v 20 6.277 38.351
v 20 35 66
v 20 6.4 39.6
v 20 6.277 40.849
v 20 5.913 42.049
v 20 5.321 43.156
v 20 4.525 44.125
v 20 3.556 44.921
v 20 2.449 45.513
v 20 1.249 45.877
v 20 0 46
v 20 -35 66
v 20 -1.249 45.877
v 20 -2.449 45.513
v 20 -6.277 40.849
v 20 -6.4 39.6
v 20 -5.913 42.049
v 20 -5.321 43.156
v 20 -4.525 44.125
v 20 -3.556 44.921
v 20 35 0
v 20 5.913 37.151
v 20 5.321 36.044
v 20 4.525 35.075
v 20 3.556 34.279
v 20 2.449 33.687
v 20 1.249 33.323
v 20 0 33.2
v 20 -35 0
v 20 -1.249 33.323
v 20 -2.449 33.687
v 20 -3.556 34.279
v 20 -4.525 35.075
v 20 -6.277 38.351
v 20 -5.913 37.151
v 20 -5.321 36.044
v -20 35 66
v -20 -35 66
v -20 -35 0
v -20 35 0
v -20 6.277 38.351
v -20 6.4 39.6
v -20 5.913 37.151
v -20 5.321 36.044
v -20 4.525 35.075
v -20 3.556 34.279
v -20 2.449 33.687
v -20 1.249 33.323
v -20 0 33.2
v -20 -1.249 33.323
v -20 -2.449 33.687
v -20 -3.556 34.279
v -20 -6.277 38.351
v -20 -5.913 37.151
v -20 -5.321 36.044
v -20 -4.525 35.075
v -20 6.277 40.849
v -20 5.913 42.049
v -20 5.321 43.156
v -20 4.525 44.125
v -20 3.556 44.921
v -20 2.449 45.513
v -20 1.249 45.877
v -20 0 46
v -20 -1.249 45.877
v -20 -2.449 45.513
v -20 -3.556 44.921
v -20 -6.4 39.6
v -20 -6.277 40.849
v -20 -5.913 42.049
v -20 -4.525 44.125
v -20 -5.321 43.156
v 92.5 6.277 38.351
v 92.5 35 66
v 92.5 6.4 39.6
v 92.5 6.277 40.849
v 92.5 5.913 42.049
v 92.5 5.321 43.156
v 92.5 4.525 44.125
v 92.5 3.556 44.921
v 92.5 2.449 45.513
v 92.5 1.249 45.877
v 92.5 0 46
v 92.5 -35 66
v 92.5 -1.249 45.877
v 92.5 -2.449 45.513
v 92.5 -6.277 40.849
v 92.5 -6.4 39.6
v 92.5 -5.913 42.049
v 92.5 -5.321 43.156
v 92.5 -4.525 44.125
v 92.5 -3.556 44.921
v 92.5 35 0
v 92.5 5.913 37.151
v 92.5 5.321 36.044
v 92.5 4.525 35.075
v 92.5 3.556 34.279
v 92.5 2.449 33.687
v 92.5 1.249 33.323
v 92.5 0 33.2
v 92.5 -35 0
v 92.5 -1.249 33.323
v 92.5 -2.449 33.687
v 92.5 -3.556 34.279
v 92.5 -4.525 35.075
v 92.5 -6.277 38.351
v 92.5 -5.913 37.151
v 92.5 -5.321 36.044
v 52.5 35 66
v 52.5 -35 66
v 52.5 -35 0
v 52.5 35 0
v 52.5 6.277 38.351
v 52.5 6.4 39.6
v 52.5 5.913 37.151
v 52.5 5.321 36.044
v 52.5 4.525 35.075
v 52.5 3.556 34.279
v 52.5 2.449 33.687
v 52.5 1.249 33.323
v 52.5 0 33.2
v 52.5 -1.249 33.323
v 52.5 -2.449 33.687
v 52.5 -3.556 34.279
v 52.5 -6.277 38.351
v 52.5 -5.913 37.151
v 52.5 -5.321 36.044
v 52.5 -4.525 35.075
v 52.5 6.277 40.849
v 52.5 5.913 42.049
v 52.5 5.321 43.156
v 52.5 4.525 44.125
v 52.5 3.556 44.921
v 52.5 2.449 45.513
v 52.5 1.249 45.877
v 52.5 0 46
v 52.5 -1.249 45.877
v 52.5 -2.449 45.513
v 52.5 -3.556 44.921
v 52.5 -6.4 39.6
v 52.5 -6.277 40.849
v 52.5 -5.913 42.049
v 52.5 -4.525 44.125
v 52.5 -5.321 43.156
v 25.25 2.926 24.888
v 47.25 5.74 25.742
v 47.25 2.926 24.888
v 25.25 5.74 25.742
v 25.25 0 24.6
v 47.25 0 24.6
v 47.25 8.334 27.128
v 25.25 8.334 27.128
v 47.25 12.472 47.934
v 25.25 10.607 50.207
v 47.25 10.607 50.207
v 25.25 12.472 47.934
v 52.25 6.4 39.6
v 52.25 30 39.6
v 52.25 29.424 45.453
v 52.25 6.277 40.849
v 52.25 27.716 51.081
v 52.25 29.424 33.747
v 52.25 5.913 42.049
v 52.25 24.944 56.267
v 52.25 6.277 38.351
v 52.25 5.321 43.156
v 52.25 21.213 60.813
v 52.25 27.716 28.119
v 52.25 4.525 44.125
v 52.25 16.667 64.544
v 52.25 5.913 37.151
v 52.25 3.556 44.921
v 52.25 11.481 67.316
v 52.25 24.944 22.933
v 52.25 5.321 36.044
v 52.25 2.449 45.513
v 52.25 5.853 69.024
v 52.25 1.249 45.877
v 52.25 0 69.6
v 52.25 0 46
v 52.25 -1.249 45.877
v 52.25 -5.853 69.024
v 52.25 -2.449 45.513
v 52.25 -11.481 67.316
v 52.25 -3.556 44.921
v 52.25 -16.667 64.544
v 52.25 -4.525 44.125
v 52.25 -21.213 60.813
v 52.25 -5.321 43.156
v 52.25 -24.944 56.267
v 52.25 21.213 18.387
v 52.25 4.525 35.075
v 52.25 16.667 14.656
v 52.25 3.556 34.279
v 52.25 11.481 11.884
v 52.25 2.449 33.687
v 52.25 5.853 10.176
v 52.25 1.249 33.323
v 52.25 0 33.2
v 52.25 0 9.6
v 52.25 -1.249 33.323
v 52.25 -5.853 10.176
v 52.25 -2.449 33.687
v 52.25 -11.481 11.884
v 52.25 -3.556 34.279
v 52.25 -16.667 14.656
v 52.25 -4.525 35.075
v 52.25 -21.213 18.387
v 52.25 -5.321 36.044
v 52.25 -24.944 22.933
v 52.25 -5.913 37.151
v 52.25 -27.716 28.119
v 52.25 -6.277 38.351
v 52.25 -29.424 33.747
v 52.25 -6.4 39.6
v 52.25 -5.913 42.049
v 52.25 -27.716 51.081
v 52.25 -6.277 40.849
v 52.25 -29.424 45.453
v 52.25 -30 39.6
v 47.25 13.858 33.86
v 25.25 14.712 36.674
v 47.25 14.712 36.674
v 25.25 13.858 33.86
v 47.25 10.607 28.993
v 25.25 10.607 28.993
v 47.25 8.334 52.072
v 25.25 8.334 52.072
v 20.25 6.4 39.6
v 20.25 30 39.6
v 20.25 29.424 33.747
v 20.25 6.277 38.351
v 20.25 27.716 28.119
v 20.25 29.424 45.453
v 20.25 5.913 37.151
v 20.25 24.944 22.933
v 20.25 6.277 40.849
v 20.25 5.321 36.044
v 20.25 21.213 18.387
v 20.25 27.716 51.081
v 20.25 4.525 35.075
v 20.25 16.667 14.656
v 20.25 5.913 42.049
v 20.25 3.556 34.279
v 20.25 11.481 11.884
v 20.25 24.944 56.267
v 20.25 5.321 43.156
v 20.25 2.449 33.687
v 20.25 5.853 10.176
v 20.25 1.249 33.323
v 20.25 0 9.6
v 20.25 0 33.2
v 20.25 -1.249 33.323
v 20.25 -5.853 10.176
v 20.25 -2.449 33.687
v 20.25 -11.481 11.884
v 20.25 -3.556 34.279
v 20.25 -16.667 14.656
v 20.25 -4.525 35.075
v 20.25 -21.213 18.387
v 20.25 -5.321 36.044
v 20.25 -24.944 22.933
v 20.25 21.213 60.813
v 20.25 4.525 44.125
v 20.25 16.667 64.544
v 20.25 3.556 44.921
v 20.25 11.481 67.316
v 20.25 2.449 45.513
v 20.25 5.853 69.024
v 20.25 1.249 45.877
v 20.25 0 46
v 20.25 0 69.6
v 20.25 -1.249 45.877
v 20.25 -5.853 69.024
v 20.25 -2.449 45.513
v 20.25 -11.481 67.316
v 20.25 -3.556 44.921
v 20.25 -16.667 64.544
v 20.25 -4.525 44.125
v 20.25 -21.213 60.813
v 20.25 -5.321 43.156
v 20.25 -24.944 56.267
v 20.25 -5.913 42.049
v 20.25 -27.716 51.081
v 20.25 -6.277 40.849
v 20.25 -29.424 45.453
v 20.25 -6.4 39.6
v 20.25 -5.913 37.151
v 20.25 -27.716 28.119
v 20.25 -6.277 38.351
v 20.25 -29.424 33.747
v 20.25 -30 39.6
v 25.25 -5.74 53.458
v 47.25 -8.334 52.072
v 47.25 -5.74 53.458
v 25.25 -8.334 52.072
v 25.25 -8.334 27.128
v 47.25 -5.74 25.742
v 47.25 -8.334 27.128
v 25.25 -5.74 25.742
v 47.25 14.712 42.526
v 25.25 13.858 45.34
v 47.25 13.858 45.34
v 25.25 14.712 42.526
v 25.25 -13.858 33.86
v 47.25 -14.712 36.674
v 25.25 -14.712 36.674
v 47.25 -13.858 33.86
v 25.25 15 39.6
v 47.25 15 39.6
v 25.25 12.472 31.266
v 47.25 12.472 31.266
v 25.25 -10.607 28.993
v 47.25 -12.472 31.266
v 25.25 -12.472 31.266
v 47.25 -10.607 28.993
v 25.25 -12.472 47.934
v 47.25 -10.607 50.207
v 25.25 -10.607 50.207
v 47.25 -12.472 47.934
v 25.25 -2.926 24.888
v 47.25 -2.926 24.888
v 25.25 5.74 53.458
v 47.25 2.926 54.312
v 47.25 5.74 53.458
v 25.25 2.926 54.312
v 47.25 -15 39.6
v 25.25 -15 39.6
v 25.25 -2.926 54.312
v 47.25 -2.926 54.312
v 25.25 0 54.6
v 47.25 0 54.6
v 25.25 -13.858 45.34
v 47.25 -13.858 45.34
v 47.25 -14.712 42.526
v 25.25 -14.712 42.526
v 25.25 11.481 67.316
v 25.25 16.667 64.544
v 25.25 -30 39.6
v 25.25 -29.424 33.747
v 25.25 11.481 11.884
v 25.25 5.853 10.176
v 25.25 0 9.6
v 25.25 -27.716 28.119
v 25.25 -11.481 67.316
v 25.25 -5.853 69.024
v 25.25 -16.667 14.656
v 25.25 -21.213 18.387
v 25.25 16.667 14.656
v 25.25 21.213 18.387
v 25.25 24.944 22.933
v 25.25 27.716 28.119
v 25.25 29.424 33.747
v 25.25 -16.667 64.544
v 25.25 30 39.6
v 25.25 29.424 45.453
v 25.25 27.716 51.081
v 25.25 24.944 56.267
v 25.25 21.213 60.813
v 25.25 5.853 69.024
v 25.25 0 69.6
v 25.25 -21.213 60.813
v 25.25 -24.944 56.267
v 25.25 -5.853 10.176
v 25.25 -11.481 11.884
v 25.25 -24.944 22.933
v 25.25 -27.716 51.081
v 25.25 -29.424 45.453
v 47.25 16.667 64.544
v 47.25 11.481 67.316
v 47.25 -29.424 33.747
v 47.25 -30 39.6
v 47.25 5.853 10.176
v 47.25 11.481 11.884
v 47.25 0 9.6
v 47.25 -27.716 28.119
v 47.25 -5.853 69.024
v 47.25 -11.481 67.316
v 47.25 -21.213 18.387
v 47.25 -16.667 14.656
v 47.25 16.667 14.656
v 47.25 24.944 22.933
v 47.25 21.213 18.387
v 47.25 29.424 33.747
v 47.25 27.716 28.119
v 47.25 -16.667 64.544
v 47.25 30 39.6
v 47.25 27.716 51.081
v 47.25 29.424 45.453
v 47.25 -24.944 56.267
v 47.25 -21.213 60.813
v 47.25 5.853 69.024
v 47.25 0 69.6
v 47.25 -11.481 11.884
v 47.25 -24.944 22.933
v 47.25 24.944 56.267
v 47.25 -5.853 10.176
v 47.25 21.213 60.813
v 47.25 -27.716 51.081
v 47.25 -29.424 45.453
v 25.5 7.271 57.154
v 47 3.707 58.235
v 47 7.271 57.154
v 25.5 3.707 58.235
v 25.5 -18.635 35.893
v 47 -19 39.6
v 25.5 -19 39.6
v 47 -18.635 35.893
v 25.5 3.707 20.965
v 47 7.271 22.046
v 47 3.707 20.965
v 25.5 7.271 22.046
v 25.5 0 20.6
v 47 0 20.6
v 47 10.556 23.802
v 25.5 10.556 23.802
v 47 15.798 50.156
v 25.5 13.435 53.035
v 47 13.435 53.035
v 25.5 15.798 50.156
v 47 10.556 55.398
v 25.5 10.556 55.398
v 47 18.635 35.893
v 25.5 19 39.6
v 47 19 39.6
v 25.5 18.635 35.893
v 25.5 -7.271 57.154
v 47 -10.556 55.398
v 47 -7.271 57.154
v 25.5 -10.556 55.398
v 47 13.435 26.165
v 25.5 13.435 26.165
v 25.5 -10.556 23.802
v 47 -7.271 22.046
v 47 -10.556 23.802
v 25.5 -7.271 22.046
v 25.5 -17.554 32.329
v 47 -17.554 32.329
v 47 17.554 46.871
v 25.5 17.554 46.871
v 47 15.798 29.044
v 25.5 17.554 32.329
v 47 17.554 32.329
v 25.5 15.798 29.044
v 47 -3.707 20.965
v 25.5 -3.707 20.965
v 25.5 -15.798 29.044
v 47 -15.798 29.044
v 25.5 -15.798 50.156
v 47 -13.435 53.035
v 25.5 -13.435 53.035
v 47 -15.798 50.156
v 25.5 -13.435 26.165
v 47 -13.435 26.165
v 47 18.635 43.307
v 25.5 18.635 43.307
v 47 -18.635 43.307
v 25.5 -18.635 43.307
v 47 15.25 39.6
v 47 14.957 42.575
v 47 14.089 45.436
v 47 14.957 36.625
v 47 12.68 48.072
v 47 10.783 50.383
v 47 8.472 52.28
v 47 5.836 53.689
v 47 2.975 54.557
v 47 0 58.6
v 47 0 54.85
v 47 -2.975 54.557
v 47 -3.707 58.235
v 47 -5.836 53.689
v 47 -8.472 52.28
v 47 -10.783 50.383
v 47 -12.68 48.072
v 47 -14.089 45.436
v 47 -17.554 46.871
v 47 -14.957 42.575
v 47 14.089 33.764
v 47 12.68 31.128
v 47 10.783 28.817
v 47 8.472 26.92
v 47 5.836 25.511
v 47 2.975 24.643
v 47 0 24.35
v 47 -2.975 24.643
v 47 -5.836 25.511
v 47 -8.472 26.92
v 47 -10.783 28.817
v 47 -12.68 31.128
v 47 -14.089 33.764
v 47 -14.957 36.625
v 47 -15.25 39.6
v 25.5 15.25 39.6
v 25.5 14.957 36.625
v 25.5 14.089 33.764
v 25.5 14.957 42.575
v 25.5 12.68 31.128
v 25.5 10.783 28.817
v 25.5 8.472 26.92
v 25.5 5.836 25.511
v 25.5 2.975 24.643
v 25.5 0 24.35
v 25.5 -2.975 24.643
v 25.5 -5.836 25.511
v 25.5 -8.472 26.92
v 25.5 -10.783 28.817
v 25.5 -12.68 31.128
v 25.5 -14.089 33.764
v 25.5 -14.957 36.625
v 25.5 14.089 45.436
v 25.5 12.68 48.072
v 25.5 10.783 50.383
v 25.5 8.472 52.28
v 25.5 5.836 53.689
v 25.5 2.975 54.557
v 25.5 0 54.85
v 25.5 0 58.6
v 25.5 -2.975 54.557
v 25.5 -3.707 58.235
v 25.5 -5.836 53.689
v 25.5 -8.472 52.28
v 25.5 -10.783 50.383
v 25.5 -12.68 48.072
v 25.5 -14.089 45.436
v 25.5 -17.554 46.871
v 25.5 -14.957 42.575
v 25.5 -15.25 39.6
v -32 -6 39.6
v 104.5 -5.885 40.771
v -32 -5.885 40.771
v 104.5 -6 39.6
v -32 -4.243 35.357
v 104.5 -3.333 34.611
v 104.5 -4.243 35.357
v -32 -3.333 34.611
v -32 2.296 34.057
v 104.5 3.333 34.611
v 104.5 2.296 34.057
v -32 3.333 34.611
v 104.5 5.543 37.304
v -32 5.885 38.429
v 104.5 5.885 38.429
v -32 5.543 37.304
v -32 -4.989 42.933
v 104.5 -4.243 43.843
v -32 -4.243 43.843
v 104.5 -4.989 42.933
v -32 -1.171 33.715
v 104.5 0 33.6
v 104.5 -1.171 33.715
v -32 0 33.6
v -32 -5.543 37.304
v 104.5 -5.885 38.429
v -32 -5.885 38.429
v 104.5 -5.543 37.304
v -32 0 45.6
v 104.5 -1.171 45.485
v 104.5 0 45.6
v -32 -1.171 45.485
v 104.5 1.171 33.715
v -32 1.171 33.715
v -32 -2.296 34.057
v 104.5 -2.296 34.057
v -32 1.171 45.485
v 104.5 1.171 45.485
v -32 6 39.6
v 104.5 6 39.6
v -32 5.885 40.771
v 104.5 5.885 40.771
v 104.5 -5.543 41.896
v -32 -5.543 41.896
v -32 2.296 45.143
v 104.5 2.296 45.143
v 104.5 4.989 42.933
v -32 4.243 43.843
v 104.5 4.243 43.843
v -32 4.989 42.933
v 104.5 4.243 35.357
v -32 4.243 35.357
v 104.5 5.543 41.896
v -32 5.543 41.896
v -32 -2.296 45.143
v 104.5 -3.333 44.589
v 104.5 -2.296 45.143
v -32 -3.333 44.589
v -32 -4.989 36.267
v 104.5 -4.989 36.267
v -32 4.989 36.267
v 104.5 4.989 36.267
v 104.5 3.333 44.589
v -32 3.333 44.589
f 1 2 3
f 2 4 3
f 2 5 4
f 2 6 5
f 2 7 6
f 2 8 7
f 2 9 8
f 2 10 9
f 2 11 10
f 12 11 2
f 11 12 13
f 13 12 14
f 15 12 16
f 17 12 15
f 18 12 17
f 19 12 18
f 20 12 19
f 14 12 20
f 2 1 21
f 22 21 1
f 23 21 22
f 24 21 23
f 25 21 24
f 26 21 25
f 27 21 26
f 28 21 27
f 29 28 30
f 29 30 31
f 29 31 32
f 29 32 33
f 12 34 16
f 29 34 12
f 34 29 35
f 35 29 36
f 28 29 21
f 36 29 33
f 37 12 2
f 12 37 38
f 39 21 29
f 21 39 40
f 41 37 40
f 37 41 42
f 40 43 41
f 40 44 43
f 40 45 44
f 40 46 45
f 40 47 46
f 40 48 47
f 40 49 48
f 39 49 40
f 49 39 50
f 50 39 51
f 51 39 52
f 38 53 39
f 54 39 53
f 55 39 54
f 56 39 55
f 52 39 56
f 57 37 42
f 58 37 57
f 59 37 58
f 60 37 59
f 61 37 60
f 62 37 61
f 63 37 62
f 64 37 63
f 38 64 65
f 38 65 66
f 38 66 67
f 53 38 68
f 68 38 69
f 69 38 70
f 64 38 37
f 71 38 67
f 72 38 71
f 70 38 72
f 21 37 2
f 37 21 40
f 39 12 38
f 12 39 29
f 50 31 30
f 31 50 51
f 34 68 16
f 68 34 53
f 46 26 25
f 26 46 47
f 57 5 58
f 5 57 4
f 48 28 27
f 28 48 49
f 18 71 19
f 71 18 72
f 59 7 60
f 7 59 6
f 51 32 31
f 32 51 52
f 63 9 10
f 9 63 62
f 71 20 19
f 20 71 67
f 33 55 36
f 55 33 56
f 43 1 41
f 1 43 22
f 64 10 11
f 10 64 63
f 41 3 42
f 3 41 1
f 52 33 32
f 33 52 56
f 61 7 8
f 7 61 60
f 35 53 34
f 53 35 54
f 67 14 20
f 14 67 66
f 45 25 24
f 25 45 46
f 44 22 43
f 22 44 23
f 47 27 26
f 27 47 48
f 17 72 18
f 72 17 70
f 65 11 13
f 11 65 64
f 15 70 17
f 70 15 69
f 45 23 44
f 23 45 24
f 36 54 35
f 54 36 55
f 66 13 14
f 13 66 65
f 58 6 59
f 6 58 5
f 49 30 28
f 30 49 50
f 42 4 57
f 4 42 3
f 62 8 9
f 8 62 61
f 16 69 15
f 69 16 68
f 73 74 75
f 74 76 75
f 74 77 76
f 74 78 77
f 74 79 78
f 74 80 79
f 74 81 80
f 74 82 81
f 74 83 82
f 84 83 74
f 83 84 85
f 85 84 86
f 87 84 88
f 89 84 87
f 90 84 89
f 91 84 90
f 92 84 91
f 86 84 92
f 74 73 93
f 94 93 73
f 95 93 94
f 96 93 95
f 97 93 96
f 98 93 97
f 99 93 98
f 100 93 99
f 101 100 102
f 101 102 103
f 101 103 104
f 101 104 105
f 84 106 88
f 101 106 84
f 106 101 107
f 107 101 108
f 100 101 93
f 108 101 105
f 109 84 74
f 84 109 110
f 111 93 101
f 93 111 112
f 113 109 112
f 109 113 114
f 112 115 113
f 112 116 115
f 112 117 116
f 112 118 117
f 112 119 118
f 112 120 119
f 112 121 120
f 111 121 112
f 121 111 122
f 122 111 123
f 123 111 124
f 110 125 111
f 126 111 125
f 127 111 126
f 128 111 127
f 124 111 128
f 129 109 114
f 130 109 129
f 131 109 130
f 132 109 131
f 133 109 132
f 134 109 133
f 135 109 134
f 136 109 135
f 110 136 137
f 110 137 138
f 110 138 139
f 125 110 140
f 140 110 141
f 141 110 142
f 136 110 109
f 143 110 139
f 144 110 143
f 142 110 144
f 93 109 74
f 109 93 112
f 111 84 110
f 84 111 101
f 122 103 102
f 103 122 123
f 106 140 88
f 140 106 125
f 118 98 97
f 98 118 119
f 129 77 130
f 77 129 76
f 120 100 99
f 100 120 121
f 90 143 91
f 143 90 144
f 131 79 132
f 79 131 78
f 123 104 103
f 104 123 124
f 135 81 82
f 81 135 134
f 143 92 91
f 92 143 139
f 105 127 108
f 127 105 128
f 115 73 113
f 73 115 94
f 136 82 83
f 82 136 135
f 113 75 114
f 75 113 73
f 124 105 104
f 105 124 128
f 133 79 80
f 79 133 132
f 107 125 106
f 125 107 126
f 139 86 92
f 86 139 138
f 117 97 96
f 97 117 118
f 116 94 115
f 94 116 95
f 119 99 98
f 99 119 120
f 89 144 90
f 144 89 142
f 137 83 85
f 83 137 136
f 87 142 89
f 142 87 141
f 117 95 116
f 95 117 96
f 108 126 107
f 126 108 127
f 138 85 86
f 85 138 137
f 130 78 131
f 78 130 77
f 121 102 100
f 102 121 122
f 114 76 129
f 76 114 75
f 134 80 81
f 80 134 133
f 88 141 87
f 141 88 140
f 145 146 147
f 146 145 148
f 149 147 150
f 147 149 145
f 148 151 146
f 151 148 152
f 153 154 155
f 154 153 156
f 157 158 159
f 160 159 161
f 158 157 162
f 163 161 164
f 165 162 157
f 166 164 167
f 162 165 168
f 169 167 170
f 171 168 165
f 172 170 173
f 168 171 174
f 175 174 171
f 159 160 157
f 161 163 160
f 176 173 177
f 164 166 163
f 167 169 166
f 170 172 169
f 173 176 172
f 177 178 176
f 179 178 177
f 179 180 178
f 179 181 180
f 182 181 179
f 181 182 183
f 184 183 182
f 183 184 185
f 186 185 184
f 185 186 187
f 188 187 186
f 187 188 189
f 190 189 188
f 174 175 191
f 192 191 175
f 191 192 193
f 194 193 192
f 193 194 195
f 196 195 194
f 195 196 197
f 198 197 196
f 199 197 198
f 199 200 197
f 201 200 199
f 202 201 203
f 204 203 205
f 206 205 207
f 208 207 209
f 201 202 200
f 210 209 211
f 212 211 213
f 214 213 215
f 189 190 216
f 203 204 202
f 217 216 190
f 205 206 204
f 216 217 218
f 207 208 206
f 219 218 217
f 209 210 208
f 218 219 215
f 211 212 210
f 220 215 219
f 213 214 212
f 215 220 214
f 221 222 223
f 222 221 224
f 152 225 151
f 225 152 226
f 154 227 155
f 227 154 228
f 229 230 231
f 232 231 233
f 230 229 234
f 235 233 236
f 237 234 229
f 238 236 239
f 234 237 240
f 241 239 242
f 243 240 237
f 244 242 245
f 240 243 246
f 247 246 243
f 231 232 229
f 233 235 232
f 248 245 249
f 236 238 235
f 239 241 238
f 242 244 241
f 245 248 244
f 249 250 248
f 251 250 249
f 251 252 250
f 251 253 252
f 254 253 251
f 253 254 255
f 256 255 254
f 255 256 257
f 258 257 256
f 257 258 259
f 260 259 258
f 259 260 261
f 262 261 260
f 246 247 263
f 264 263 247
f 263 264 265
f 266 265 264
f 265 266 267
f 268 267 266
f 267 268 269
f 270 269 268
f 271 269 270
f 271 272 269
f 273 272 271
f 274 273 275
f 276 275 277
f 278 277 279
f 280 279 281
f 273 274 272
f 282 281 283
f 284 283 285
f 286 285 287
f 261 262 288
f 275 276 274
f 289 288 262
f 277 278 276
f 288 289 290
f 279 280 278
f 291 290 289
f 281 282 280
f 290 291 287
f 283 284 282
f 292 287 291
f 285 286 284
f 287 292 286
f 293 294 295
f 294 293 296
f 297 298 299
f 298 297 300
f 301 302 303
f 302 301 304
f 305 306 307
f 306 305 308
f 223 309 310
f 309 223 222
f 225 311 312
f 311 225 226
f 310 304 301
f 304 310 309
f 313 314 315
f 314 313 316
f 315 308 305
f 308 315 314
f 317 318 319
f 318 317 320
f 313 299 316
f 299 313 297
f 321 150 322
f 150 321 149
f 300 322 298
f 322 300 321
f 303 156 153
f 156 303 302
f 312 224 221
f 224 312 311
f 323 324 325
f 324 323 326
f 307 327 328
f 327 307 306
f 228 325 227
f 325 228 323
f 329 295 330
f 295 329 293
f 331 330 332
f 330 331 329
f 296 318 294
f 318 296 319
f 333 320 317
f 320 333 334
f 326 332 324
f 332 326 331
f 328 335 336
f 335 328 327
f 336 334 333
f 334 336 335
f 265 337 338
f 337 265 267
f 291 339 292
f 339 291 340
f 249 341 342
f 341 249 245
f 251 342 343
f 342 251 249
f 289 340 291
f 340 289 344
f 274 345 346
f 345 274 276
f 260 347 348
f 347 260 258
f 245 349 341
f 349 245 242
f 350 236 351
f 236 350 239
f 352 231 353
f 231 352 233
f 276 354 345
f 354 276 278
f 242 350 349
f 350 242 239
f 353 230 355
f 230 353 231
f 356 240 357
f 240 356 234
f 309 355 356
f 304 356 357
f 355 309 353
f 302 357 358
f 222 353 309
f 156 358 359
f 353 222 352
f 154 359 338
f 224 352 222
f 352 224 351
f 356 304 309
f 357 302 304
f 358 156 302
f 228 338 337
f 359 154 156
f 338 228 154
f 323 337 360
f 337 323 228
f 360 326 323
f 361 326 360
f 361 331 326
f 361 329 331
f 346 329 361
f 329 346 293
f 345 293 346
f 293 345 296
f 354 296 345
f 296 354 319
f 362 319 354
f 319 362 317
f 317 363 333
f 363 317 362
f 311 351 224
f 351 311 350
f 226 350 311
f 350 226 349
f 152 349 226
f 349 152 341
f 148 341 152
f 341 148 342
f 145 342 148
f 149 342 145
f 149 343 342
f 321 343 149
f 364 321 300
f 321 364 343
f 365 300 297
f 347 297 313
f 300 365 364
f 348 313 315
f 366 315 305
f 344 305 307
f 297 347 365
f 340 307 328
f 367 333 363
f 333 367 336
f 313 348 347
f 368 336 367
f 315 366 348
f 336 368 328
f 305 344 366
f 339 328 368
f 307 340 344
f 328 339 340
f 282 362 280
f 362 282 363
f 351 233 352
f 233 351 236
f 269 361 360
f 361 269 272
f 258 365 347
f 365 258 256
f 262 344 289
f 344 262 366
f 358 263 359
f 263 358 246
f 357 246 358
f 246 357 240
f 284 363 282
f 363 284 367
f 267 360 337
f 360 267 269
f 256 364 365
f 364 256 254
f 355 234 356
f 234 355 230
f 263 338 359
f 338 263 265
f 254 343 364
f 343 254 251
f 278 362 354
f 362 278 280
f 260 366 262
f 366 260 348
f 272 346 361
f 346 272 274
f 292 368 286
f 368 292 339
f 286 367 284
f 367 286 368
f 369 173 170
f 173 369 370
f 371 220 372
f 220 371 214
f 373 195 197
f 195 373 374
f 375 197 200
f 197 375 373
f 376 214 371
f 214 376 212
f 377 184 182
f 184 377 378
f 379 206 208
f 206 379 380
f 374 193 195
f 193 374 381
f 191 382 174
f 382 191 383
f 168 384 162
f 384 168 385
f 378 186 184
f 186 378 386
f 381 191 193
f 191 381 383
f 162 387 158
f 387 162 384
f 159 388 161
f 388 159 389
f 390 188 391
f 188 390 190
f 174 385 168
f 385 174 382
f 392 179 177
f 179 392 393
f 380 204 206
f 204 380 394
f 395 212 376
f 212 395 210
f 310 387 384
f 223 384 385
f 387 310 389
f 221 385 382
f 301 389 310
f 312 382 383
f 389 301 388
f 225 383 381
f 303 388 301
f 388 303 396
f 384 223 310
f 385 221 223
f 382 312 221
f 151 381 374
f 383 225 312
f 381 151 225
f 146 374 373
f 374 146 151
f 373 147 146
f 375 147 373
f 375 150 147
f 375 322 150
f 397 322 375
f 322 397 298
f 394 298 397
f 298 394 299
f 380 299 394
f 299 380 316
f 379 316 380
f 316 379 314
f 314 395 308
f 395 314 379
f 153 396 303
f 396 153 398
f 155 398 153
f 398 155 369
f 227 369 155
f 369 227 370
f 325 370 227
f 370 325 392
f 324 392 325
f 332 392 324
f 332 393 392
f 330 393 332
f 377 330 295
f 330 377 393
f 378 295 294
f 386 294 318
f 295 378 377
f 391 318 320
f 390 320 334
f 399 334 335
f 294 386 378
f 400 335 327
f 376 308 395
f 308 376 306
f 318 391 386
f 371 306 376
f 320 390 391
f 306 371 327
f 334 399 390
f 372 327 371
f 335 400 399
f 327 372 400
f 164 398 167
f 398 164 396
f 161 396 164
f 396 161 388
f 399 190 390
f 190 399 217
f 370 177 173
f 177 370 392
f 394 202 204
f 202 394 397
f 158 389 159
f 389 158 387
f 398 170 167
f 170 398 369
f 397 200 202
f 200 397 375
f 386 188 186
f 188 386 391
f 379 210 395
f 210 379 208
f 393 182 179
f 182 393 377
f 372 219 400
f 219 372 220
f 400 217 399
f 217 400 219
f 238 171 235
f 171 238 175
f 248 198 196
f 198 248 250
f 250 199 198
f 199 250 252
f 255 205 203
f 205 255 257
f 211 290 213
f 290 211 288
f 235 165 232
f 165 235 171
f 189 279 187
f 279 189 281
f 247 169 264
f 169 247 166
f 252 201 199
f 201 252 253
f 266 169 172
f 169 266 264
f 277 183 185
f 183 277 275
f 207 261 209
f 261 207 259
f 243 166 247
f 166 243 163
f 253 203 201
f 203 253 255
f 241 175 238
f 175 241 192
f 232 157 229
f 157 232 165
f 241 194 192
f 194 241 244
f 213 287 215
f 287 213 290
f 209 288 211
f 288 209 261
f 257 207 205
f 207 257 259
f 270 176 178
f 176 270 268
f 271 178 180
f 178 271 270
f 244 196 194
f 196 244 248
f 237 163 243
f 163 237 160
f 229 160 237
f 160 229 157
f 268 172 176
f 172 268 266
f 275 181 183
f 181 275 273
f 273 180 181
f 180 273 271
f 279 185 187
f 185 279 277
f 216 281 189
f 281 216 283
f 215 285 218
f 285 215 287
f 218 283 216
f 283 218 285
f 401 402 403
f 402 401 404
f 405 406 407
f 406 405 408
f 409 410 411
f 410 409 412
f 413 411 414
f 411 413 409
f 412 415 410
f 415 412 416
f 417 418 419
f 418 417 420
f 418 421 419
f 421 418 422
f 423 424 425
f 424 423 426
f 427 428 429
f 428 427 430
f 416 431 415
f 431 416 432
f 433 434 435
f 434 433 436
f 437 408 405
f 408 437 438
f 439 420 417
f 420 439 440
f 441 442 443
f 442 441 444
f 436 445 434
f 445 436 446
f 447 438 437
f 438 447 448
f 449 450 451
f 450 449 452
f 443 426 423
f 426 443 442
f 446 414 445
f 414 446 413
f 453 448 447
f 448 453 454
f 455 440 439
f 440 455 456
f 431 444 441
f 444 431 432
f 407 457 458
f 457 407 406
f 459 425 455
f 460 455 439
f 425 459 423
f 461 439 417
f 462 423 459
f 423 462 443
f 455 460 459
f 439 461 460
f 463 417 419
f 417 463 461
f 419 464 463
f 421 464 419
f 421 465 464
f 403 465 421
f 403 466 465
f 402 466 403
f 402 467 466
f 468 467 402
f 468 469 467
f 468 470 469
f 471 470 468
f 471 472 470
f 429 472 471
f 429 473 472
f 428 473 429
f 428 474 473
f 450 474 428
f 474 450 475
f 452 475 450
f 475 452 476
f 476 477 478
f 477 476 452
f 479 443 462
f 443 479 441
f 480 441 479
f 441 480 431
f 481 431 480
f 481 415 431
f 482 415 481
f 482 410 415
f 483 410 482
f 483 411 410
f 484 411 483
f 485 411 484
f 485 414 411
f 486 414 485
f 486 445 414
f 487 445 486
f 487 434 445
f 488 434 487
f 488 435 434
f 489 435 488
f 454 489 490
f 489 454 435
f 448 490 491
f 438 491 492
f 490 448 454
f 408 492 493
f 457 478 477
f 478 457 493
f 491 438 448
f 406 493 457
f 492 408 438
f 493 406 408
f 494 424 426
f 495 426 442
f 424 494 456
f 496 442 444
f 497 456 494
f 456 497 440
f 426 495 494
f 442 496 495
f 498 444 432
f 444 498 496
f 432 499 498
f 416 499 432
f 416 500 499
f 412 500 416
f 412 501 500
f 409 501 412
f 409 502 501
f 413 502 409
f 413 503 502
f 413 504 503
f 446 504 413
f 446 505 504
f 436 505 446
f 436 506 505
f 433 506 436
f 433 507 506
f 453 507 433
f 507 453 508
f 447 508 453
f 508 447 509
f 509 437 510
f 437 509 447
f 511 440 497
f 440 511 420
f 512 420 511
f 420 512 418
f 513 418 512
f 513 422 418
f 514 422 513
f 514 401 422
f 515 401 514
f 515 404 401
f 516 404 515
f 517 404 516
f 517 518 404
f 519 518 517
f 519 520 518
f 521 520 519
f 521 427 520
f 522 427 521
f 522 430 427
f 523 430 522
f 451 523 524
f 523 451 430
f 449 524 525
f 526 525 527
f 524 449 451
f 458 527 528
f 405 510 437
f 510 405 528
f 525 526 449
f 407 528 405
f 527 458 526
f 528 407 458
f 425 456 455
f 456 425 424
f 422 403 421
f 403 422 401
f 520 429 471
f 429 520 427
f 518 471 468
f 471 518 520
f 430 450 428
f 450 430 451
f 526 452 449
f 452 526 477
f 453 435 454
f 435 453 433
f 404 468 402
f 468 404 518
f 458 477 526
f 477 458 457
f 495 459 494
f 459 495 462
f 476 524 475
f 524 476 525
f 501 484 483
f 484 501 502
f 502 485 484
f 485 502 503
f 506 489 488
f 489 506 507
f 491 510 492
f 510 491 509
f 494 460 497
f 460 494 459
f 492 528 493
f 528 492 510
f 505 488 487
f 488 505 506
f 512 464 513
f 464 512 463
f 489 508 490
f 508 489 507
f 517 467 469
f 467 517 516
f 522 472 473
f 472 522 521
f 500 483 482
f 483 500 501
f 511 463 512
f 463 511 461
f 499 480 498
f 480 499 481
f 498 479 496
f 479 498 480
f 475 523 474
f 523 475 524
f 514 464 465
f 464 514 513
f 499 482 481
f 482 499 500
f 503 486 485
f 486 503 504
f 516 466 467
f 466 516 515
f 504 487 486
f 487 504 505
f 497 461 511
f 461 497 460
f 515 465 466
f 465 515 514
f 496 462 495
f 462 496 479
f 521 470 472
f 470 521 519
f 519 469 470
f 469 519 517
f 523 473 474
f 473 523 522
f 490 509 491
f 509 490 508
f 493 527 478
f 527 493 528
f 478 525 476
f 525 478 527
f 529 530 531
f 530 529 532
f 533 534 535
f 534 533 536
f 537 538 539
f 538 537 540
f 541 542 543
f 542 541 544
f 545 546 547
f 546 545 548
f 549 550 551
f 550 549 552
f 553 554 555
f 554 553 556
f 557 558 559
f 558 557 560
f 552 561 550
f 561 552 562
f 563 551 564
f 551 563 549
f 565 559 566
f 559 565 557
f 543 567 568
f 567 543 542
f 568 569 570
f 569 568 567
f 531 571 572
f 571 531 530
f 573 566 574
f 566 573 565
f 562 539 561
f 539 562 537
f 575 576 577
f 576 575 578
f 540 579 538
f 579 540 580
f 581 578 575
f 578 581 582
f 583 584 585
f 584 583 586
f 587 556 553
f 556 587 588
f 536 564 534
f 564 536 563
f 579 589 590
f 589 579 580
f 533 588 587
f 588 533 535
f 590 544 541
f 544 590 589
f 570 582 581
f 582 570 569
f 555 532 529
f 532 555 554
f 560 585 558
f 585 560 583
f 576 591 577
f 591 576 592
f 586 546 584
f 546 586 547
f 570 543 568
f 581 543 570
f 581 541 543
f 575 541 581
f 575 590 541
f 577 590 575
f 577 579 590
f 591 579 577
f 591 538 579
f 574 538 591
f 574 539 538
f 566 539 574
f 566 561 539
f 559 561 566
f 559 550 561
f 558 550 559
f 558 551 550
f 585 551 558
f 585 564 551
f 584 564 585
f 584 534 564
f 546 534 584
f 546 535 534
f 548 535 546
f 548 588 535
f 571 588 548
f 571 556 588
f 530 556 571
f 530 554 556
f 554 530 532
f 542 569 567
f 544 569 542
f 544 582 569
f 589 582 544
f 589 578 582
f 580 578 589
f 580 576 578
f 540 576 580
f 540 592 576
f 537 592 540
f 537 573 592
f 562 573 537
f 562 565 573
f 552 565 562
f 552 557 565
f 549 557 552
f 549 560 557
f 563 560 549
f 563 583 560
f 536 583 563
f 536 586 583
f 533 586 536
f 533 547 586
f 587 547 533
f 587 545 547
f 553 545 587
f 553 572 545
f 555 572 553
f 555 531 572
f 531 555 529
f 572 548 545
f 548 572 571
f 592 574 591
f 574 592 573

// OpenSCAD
$fn = 32;

// ------------------------------------------------------------------------
// Pulley assembly: d60 pulley with a belt, shaft d12
// Every part is its own module, assembly() places them once.
// ------------------------------------------------------------------------

// --- part 1 ---
module support1() {
  difference() {
    translate([-20, -35, 0]) cube([40, 70, 66]);
    translate([0, 0, 39.6]) rotate([0, 90, 0]) cylinder(h = 42, d = 12.8, center = true);
  }
}

// --- part 2 ---
module support2() {
  difference() {
    translate([-20, -35, 0]) cube([40, 70, 66]);
    translate([0, 0, 39.6]) rotate([0, 90, 0]) cylinder(h = 42, d = 12.8, center = true);
  }
}

// --- part 3 ---
module shaft() {
  translate([0, 0, -68.25]) cylinder(h = 136.5, d = 12);
}

// --- part 4 ---
module pulley() {
  difference() {
    union() {
      cylinder(h = 32, d = 30);
      cylinder(h = 5, d = 60);
      translate([0, 0, 27]) cylinder(h = 5, d = 60);
    }
    translate([0, 0, -1]) cylinder(h = 34, d = 12.8);
  }
}

// --- part 5 ---
module belt() {
  difference() {
      translate([0, 0, 0]) cylinder(h = 21.5, d = 38);
      translate([0, 0, -1]) cylinder(h = 23.5, d = 30.5);
    }
}

// --- assembly ---
module assembly() {
  translate([0, 0, 0]) rotate([0, 0, 0]) support1();
  translate([72.5, 0, 0]) rotate([0, 0, 0]) support2();
  translate([36.25, 0, 39.6]) rotate([0, 90, 0]) shaft();
  translate([20.25, 0, 39.6]) rotate([0, 90, 0]) pulley();
  translate([25.5, 0, 39.6]) rotate([0, 90, 0]) belt();
}

assembly();
